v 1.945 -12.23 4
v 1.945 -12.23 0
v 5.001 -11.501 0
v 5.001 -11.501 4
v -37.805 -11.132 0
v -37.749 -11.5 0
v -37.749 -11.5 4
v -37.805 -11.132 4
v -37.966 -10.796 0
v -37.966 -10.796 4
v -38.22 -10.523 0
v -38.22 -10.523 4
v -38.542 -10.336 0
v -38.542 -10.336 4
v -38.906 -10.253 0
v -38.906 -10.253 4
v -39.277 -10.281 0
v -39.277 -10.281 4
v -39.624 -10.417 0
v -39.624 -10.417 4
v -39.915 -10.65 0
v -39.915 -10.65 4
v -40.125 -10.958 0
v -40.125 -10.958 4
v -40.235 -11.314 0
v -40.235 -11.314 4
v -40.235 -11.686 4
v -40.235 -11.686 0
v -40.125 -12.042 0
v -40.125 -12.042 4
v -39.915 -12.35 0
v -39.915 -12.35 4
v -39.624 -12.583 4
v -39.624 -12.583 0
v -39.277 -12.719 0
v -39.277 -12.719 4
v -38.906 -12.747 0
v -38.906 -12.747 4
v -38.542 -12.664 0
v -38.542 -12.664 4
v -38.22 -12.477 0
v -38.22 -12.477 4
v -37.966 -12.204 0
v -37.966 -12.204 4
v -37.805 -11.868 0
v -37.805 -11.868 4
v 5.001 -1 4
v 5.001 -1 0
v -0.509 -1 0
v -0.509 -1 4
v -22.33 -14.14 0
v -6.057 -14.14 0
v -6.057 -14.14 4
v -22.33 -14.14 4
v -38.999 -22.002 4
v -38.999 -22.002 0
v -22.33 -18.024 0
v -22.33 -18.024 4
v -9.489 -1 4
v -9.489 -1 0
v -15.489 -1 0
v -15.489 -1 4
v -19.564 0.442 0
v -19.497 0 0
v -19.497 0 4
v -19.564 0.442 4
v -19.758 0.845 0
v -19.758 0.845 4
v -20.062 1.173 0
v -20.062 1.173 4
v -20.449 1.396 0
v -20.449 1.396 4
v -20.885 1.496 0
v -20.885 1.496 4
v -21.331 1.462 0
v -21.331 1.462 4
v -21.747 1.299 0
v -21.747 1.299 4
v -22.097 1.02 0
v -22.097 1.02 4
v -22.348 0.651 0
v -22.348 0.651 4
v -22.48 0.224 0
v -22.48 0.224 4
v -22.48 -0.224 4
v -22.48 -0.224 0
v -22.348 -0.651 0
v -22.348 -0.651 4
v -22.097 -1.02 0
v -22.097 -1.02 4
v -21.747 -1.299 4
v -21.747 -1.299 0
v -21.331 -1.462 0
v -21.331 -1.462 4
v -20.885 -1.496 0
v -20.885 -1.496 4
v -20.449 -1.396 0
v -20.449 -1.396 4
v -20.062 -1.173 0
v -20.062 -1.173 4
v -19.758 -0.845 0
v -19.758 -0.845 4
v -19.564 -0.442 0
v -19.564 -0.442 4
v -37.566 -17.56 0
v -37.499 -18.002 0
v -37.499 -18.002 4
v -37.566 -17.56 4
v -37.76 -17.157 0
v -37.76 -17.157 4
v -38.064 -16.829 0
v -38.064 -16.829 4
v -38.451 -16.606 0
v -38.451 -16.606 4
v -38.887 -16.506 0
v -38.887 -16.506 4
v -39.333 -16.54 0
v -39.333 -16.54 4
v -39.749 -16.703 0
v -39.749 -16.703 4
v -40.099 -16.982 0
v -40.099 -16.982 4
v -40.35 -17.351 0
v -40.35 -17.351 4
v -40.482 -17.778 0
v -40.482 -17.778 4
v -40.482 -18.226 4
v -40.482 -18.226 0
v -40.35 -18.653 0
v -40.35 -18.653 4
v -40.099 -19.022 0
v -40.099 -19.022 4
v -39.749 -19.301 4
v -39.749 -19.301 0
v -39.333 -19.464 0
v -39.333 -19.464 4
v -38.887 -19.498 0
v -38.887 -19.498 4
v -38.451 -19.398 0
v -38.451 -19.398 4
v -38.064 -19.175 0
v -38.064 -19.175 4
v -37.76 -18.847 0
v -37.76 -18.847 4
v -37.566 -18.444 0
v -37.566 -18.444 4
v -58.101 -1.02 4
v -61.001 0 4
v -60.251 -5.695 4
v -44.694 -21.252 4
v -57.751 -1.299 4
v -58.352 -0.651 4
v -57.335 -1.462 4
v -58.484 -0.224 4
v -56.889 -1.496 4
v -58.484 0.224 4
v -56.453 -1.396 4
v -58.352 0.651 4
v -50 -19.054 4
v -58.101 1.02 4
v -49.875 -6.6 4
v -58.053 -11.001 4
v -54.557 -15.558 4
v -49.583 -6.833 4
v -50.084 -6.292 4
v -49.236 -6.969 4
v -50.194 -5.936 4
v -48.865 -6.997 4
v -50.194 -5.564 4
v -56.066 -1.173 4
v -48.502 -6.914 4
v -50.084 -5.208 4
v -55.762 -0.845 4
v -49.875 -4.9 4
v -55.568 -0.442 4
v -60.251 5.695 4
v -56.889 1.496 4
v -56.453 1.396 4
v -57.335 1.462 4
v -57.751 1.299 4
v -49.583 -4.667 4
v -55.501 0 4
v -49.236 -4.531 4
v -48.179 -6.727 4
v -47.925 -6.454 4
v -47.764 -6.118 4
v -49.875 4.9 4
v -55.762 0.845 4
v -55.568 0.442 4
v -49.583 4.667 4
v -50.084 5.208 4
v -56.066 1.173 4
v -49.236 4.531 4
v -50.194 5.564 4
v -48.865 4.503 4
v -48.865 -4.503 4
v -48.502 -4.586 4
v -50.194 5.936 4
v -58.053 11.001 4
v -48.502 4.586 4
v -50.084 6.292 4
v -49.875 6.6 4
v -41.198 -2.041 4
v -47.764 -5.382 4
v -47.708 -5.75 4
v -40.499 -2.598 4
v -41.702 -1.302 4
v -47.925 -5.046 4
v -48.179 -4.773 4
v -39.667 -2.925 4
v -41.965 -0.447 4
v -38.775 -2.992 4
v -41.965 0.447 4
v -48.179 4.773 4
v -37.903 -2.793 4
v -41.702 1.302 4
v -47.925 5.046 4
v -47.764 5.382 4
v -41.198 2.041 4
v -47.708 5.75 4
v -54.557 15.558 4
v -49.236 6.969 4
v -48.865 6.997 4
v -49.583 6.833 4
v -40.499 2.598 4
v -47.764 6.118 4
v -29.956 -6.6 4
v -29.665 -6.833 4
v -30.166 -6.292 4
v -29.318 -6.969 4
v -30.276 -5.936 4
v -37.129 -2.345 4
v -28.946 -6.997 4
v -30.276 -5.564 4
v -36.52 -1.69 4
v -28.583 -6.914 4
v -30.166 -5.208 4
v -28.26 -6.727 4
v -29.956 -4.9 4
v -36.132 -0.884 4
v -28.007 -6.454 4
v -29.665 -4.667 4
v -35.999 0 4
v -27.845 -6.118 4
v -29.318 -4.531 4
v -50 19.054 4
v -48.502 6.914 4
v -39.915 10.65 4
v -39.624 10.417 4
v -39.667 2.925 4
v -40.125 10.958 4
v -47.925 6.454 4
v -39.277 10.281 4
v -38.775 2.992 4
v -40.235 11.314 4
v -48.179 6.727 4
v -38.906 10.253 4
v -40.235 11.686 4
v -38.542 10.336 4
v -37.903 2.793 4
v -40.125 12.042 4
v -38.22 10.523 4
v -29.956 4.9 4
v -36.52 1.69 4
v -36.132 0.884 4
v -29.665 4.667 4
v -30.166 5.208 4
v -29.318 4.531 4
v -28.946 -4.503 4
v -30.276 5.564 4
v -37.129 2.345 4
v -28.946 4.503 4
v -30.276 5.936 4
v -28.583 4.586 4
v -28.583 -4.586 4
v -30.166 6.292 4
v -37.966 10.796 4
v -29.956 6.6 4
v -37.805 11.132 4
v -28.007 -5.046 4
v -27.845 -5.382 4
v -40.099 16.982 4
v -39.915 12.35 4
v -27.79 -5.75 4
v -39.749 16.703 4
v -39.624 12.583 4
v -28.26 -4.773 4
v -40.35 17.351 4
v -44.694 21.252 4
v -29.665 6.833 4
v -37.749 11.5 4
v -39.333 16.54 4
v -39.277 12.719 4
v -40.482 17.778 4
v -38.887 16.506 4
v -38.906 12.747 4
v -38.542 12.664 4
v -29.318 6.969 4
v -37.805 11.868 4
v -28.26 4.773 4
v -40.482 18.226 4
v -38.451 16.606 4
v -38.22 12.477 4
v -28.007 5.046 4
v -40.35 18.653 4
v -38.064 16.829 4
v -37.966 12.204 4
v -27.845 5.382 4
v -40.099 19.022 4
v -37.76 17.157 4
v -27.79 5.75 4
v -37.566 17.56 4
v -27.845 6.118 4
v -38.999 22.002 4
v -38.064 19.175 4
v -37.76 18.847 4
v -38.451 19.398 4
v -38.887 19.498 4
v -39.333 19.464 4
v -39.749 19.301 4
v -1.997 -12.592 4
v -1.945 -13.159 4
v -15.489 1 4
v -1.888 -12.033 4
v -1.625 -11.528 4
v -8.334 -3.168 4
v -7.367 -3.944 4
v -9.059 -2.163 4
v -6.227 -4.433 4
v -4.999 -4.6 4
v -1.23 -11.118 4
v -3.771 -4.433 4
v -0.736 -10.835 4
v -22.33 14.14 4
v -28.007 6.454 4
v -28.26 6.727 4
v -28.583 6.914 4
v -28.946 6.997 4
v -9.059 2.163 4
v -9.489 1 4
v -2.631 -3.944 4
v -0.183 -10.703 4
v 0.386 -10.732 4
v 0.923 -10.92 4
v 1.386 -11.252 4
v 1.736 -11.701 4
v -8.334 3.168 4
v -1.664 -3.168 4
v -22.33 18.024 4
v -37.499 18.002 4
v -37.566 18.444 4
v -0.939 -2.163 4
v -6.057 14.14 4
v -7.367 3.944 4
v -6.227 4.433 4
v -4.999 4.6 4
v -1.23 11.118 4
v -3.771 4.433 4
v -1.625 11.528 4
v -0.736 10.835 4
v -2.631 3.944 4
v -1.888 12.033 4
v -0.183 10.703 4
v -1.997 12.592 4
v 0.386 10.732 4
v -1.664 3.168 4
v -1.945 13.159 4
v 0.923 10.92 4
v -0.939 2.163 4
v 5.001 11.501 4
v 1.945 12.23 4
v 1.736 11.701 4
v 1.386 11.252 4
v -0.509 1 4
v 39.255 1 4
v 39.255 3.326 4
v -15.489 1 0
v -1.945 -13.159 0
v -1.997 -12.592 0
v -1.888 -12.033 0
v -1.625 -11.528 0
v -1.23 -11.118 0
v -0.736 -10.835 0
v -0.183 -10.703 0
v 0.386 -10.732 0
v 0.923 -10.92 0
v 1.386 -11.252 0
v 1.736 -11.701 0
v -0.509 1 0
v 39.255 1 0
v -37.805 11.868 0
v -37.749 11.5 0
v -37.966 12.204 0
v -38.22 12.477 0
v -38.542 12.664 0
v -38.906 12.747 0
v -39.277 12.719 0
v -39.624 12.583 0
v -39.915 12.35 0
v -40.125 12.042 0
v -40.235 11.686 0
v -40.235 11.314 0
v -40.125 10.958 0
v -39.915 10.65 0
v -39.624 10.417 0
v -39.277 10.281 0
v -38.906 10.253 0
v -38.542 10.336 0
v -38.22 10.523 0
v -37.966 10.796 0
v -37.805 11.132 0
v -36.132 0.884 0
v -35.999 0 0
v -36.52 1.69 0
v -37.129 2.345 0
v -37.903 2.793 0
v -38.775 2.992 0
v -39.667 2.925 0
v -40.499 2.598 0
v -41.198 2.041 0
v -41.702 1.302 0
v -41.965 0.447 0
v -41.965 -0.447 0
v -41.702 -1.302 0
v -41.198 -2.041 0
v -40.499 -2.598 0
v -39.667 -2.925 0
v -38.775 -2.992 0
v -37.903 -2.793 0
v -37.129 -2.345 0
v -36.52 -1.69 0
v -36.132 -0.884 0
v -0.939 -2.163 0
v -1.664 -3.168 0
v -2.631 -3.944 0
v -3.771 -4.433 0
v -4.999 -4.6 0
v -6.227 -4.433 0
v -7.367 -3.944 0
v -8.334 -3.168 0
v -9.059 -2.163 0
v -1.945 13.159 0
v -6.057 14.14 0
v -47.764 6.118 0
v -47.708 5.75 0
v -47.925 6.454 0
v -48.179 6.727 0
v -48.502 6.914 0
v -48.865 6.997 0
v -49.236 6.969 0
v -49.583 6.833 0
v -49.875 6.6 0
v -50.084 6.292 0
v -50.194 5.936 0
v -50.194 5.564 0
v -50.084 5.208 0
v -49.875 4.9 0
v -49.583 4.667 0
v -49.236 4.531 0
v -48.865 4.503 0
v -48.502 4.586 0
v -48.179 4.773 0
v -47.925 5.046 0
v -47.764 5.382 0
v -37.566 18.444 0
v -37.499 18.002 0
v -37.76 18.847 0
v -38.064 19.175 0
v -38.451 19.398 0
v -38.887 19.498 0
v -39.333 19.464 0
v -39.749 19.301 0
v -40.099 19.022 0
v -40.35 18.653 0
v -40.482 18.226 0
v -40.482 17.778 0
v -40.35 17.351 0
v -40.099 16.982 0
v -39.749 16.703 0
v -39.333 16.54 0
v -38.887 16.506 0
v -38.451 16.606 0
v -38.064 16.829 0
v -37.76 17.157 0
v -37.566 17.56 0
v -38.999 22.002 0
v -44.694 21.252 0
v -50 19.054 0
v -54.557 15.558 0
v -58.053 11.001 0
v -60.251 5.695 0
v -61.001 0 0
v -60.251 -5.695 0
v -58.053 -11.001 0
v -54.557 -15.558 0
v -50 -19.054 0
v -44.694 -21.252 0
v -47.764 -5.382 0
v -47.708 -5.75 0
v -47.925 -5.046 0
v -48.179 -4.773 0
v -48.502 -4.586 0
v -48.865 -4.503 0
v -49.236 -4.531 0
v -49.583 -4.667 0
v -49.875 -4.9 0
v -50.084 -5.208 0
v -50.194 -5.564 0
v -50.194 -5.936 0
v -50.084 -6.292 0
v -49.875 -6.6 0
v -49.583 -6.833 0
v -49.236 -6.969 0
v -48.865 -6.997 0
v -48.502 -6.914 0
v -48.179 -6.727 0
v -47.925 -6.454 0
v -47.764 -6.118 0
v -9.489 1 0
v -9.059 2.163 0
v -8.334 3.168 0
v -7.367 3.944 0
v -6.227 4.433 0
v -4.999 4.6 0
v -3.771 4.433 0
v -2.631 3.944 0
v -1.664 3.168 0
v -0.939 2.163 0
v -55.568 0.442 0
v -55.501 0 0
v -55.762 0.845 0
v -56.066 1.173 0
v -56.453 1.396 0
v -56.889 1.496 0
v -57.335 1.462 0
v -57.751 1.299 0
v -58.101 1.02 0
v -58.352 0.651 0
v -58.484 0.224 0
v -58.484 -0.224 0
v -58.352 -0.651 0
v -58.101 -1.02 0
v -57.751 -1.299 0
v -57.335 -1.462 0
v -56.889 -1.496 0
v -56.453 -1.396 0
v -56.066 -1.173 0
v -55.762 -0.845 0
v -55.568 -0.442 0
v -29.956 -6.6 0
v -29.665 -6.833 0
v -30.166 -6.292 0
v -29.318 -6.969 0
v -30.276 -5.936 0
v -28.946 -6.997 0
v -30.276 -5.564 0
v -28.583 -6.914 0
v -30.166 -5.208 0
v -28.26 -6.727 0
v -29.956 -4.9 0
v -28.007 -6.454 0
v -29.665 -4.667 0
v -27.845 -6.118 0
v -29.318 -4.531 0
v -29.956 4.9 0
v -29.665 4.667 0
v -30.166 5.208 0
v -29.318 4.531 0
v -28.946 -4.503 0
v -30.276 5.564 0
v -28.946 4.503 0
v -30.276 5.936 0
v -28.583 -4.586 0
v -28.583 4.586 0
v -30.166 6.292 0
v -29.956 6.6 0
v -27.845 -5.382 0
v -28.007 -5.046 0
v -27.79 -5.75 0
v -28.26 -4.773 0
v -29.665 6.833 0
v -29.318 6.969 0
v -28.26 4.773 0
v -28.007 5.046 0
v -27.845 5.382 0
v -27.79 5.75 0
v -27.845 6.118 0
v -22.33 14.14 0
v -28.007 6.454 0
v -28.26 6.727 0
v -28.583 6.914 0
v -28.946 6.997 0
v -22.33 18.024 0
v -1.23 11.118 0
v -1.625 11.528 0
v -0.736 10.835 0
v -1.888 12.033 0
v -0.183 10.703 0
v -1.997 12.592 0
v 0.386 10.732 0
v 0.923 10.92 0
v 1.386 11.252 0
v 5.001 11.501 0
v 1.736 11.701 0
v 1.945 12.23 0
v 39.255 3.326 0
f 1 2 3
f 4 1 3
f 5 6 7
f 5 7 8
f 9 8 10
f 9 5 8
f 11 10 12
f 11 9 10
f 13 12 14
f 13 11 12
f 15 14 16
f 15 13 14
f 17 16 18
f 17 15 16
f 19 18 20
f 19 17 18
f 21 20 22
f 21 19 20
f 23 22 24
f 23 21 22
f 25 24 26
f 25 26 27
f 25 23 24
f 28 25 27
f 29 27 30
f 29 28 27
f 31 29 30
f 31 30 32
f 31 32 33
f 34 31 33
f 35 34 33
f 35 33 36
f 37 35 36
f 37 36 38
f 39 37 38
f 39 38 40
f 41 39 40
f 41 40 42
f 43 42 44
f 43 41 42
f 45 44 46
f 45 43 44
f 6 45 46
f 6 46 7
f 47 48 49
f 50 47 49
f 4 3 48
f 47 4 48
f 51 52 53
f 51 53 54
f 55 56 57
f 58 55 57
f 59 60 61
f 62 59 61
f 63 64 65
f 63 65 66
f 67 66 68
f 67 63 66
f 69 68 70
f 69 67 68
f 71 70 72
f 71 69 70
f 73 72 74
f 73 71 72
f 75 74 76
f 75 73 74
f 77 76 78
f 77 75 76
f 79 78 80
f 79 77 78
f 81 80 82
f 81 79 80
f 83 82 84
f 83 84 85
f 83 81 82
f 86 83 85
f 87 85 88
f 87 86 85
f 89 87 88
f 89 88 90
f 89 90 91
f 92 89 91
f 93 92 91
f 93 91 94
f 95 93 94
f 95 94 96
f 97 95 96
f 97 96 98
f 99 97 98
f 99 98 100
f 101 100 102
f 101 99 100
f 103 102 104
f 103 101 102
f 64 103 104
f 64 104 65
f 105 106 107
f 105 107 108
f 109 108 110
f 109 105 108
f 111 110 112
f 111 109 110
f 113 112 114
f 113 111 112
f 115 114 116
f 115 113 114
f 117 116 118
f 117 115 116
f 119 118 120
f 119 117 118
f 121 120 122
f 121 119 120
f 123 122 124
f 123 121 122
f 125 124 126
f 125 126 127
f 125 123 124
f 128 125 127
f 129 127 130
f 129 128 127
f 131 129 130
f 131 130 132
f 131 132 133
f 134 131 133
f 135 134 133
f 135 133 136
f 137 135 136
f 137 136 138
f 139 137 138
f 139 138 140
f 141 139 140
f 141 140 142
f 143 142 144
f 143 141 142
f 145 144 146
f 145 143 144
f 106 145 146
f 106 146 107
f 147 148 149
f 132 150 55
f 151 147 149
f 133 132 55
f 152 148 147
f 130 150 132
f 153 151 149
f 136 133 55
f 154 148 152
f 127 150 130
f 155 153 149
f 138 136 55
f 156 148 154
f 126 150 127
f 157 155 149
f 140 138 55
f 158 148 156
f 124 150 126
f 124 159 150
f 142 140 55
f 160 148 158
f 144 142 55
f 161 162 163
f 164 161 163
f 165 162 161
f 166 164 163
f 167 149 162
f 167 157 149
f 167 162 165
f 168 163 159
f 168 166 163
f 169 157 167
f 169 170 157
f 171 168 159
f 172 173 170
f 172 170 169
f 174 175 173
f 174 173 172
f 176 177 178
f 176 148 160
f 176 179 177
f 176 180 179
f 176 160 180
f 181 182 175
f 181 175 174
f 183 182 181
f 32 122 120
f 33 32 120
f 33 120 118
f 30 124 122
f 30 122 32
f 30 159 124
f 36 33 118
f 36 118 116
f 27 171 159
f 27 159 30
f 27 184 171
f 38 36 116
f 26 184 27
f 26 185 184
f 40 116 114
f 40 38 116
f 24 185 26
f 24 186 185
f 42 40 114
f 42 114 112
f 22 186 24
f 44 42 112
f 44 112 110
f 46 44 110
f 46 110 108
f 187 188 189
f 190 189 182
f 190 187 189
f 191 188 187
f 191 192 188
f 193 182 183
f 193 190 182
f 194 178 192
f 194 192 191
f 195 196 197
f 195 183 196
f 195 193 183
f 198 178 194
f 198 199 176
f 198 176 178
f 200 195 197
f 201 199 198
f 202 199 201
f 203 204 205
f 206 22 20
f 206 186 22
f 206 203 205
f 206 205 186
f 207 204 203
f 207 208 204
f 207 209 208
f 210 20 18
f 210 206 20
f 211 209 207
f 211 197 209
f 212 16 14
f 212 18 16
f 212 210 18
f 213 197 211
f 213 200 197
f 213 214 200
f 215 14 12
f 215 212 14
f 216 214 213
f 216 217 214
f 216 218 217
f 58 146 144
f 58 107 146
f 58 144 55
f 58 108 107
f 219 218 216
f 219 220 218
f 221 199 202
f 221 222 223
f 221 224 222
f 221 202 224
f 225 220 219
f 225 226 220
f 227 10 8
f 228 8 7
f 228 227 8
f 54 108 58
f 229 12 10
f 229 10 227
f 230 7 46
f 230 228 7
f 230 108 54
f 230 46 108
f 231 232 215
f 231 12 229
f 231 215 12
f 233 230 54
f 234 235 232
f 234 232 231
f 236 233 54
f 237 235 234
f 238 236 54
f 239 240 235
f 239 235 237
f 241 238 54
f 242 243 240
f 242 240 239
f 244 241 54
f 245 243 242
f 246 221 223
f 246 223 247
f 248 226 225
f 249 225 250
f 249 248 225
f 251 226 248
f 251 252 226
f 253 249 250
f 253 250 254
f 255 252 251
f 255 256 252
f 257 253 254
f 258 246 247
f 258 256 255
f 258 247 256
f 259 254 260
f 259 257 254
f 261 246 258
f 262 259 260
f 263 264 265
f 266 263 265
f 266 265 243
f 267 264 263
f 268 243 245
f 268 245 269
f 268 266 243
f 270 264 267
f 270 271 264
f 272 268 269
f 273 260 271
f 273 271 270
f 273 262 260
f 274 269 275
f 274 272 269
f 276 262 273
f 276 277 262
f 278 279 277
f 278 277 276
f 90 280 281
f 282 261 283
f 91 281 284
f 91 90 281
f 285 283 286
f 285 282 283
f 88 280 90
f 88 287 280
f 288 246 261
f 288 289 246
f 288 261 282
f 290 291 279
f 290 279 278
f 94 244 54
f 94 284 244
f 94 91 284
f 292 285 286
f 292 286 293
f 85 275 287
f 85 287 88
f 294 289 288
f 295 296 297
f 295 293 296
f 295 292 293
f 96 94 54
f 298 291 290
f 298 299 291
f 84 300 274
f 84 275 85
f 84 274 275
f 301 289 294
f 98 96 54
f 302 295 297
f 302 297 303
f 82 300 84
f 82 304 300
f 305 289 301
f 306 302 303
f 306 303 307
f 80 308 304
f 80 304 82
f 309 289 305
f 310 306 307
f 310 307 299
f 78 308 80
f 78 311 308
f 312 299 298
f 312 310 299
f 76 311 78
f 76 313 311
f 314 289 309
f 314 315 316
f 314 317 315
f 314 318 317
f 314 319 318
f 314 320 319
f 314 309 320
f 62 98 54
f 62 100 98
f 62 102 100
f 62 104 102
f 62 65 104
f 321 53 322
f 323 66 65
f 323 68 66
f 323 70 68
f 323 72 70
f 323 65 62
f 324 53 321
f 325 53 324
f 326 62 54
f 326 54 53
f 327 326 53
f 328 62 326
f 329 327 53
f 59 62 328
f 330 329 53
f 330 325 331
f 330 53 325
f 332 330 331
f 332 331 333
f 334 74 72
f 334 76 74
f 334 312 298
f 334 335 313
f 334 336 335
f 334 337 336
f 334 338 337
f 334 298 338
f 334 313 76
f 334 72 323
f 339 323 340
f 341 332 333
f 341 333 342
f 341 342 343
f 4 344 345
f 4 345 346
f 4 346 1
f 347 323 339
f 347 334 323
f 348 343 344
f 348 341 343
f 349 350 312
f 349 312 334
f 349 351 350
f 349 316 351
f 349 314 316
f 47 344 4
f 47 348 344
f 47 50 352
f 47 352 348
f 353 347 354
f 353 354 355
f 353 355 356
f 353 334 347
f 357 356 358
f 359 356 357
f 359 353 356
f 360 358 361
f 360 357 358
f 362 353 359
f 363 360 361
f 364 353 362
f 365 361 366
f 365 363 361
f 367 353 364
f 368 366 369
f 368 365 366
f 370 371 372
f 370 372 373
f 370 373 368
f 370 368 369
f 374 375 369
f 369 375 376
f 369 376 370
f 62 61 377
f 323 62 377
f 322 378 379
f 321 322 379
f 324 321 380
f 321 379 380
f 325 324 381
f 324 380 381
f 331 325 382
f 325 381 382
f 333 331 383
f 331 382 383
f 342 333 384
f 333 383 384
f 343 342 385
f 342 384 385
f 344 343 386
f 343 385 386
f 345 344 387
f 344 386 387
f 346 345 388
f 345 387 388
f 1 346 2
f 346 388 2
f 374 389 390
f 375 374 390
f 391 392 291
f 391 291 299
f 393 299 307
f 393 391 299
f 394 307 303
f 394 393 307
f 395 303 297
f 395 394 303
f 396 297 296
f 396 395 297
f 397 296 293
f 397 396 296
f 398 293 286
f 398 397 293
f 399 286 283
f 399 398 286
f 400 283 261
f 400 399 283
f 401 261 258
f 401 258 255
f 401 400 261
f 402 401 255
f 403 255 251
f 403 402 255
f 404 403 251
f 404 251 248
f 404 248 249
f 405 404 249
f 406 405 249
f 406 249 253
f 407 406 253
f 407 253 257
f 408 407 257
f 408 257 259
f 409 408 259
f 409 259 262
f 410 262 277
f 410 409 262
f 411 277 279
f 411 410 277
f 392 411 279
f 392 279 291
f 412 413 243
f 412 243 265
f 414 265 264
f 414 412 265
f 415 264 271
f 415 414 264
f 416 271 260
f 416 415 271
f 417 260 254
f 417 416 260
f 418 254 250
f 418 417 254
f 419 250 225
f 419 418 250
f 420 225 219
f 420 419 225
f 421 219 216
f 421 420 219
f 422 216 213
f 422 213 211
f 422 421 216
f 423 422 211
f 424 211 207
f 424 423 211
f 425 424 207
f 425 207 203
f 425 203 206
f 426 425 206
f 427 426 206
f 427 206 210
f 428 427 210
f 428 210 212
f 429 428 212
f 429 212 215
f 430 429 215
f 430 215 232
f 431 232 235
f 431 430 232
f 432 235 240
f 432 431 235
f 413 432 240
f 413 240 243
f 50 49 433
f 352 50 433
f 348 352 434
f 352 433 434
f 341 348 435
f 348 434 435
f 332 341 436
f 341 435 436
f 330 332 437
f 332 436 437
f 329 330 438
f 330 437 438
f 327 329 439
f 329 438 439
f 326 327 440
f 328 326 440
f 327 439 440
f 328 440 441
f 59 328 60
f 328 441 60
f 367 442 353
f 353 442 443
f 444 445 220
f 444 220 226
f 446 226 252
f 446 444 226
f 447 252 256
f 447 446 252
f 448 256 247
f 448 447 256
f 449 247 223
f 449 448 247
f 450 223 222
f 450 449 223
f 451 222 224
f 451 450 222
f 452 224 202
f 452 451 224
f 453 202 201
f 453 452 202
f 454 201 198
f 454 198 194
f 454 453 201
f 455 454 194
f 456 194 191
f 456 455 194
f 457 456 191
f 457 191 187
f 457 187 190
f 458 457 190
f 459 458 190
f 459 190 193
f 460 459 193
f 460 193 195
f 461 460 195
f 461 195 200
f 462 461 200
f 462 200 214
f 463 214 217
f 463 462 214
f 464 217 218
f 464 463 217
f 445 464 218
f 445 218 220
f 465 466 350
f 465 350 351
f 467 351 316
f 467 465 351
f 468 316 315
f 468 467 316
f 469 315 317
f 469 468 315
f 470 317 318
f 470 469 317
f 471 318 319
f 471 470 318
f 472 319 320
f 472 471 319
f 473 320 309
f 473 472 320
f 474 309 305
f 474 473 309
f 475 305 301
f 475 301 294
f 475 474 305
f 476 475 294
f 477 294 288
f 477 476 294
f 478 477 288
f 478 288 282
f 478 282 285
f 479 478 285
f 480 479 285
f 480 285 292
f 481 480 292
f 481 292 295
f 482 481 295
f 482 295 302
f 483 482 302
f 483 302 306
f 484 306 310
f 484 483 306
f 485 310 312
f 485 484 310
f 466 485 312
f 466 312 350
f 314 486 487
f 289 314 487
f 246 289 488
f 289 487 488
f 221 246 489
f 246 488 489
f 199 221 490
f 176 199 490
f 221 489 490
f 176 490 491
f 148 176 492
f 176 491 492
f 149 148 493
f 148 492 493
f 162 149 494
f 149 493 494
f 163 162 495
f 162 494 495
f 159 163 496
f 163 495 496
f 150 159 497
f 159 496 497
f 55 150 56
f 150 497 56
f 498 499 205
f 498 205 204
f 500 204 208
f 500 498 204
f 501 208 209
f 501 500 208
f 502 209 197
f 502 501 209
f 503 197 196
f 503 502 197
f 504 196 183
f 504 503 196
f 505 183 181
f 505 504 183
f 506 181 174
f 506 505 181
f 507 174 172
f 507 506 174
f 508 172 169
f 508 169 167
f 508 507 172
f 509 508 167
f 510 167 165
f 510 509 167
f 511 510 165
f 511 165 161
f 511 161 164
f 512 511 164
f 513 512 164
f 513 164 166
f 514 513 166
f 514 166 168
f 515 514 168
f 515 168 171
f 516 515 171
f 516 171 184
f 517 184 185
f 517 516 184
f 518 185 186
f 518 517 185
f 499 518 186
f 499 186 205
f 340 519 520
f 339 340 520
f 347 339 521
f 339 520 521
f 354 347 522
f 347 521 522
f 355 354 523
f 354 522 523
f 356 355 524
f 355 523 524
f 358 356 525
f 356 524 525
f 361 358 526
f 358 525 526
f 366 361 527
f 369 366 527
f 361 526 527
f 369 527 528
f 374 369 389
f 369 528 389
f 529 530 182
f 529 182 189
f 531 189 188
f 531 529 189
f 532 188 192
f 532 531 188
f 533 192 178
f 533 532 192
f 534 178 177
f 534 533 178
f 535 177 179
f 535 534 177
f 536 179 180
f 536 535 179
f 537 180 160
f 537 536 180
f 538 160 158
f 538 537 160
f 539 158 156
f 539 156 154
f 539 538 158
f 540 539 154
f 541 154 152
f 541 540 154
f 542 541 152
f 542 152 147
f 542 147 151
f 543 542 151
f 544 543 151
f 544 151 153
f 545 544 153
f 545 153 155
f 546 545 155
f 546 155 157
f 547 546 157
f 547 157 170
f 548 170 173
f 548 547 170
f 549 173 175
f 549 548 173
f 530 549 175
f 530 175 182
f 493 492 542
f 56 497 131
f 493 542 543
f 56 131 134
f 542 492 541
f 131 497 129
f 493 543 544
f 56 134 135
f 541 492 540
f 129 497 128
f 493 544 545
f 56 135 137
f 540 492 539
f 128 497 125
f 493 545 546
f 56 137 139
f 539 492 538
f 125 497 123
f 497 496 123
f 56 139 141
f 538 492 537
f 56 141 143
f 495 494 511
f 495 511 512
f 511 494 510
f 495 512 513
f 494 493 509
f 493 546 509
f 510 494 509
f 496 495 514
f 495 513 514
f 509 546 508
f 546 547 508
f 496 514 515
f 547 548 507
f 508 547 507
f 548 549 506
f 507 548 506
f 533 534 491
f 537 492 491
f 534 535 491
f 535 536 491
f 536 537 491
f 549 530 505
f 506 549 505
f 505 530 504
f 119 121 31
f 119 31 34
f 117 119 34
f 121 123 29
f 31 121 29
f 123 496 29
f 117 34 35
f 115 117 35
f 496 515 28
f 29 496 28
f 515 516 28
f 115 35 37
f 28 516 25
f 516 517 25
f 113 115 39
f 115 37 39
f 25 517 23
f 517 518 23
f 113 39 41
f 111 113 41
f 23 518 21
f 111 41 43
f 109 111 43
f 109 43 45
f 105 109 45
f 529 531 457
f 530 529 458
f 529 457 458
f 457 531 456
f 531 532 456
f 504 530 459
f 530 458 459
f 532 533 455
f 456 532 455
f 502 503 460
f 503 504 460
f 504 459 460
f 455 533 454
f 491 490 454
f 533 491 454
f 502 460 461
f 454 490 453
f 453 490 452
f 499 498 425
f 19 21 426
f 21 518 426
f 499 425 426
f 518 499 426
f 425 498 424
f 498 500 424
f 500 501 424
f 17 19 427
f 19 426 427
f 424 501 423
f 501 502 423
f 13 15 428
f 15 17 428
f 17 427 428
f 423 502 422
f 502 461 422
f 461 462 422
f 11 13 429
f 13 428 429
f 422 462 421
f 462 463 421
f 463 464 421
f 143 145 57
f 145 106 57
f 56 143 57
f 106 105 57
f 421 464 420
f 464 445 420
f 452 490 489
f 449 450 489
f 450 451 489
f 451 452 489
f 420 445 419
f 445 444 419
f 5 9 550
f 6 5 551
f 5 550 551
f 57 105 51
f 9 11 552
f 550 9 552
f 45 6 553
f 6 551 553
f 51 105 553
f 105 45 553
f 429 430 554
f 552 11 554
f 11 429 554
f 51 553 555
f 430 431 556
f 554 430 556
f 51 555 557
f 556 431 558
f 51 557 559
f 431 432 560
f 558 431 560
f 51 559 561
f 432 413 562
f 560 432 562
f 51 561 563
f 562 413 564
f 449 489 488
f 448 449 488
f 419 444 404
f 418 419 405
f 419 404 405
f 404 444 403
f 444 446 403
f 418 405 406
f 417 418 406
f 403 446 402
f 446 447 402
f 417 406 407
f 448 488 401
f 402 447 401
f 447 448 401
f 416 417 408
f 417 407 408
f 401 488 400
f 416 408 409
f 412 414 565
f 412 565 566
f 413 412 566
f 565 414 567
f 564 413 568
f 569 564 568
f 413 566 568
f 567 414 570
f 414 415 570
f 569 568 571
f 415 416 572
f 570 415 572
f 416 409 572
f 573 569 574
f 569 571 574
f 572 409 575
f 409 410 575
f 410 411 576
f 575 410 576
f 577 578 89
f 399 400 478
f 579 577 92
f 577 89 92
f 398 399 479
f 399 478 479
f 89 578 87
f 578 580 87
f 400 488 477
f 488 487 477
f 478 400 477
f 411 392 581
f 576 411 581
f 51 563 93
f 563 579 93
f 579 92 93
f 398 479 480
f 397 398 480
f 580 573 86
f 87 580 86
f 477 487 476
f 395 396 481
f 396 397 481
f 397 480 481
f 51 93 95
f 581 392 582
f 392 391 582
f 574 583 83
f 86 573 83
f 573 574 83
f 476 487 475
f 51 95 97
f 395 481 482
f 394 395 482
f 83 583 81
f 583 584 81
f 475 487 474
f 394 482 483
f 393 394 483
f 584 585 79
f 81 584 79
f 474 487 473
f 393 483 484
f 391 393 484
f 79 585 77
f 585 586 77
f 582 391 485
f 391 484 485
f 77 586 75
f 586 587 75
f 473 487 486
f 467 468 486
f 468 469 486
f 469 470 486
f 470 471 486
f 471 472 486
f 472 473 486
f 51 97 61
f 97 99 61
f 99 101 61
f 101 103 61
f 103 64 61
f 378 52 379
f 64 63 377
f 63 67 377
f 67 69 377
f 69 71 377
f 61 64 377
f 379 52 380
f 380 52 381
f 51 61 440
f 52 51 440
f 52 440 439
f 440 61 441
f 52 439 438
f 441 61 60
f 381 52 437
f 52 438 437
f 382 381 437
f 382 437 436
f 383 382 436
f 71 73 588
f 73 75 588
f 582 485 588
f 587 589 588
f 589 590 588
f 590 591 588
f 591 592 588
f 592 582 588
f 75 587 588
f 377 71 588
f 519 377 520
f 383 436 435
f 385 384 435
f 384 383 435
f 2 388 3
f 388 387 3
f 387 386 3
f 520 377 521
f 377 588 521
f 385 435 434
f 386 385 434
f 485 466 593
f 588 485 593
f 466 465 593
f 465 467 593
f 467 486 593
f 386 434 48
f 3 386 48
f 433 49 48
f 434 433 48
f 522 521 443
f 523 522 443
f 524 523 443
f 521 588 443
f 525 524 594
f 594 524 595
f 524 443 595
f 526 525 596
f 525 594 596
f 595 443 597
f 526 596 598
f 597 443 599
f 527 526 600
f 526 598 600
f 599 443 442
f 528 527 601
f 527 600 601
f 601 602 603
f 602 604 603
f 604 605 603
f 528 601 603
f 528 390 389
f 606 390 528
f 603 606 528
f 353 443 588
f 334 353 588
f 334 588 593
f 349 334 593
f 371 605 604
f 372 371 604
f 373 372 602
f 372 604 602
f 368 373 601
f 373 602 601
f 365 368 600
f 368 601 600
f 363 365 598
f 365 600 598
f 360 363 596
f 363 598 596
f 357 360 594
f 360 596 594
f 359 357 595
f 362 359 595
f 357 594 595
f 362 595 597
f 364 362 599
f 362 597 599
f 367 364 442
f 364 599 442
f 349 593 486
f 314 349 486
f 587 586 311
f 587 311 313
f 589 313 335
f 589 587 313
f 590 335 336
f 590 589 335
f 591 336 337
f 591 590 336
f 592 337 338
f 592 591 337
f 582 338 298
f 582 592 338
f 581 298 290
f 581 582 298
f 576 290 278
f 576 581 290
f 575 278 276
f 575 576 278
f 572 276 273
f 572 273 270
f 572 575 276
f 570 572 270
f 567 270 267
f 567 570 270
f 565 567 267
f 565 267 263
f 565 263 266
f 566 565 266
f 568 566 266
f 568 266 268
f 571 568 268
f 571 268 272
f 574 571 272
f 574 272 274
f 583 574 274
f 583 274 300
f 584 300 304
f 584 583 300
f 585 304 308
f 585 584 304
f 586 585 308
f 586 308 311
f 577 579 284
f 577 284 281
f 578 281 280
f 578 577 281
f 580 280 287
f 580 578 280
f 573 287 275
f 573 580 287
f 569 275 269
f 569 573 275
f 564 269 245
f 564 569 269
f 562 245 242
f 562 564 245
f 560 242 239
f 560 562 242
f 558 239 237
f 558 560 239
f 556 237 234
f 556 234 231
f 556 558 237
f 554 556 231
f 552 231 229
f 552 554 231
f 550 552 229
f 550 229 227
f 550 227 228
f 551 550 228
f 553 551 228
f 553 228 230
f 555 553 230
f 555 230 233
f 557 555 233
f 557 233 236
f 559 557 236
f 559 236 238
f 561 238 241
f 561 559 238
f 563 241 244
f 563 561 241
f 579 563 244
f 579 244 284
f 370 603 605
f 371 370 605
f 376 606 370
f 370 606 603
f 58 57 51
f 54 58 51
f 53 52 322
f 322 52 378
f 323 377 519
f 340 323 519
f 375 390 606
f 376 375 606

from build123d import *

# Parameters (mm, degrees)
SKETCH_1_R          = 3
SKETCH_1_R_2        = 1.25
SKETCH_1_R_3        = 1.5
EXTRUDE_1_DEPTH     = 4
SKETCH_2_R          = 2
SKETCH_2_W          = 18.21777686
SKETCH_2_H          = 14.090430323
CUT_EXTRUDE_1_DEPTH = 4


with BuildPart() as part:
    # 草图1 → 凸台-拉伸1 (new body)
    with BuildSketch(Plane.XY):
        with BuildLine():
            Line((-15.488984032, 1), (-9.488984032, 1))
            ThreePointArc((-9.488984032, 1), (-4.998995168, 4.6), (-0.509006304, 1))
            Line((-0.509006304, 1), (5.001004832, 1))
            Line((5.001004832, 1), (39.254812875, 1))
            Line((39.254812875, 1), (39.254812875, 3.326018382))
            Line((39.254812875, 3.326018382), (5.001004832, 11.501004832))
            Line((5.001004832, 11.501004832), (-38.998995168, 22.002009663))
            ThreePointArc((-38.998995168, 22.002009663), (-61.001004832, 0), (-38.998995168, -22.002009663))
            Line((-38.998995168, -22.002009663), (5.001004832, -11.501004832))
            Line((5.001004832, -11.501004832), (5.001004832, -1))
            Line((5.001004832, -1), (-0.509006304, -1))
            ThreePointArc((-0.509006304, -1), (-4.998995168, -4.6), (-9.488984032, -1))
            Line((-9.488984032, -1), (-15.488984032, -1))
            Line((-15.488984032, -1), (-15.488984032, 1))
        make_face()
        with Locations((-38.998995168, 0)):
            Circle(SKETCH_1_R, mode=Mode.SUBTRACT)
        with Locations((-38.998995168, -11.5)):
            Circle(SKETCH_1_R_2, mode=Mode.SUBTRACT)
        with Locations((-48.958287312, -5.75)):
            Circle(SKETCH_1_R_2, mode=Mode.SUBTRACT)
        with Locations((-48.958287312, 5.75)):
            Circle(SKETCH_1_R_2, mode=Mode.SUBTRACT)
        with Locations((-38.998995168, 11.5)):
            Circle(SKETCH_1_R_2, mode=Mode.SUBTRACT)
        with Locations((-29.039703025, 5.75)):
            Circle(SKETCH_1_R_2, mode=Mode.SUBTRACT)
        with Locations((-29.039703025, -5.75)):
            Circle(SKETCH_1_R_2, mode=Mode.SUBTRACT)
        with Locations((-38.998995168, -18.002009663)):
            Circle(SKETCH_1_R_3, mode=Mode.SUBTRACT)
        with Locations((-38.998995168, 18.002009663)):
            Circle(SKETCH_1_R_3, mode=Mode.SUBTRACT)
        with Locations((-57.001004832, 0)):
            Circle(SKETCH_1_R_3, mode=Mode.SUBTRACT)
        with Locations((-20.996985505, 0)):
            Circle(SKETCH_1_R_3, mode=Mode.SUBTRACT)
    extrude(amount=EXTRUDE_1_DEPTH)

    # 草图2 → 切除-拉伸1 (cut)
    with BuildSketch(Plane(origin=(0, 0, 0), x_dir=(-1, 0, 0), z_dir=(0, 0, -1))):
        with Locations((0, 12.694540648)):
            Circle(SKETCH_2_R)
        with Locations((0, -12.694540648)):
            Circle(SKETCH_2_R)
        with Locations((13.221008307, 21.185215162)):
            Rectangle(SKETCH_2_W, SKETCH_2_H)
        with Locations((13.221008307, -21.185215162)):
            Rectangle(SKETCH_2_W, SKETCH_2_H)
    extrude(amount=-CUT_EXTRUDE_1_DEPTH, mode=Mode.SUBTRACT)


solid = part.part
